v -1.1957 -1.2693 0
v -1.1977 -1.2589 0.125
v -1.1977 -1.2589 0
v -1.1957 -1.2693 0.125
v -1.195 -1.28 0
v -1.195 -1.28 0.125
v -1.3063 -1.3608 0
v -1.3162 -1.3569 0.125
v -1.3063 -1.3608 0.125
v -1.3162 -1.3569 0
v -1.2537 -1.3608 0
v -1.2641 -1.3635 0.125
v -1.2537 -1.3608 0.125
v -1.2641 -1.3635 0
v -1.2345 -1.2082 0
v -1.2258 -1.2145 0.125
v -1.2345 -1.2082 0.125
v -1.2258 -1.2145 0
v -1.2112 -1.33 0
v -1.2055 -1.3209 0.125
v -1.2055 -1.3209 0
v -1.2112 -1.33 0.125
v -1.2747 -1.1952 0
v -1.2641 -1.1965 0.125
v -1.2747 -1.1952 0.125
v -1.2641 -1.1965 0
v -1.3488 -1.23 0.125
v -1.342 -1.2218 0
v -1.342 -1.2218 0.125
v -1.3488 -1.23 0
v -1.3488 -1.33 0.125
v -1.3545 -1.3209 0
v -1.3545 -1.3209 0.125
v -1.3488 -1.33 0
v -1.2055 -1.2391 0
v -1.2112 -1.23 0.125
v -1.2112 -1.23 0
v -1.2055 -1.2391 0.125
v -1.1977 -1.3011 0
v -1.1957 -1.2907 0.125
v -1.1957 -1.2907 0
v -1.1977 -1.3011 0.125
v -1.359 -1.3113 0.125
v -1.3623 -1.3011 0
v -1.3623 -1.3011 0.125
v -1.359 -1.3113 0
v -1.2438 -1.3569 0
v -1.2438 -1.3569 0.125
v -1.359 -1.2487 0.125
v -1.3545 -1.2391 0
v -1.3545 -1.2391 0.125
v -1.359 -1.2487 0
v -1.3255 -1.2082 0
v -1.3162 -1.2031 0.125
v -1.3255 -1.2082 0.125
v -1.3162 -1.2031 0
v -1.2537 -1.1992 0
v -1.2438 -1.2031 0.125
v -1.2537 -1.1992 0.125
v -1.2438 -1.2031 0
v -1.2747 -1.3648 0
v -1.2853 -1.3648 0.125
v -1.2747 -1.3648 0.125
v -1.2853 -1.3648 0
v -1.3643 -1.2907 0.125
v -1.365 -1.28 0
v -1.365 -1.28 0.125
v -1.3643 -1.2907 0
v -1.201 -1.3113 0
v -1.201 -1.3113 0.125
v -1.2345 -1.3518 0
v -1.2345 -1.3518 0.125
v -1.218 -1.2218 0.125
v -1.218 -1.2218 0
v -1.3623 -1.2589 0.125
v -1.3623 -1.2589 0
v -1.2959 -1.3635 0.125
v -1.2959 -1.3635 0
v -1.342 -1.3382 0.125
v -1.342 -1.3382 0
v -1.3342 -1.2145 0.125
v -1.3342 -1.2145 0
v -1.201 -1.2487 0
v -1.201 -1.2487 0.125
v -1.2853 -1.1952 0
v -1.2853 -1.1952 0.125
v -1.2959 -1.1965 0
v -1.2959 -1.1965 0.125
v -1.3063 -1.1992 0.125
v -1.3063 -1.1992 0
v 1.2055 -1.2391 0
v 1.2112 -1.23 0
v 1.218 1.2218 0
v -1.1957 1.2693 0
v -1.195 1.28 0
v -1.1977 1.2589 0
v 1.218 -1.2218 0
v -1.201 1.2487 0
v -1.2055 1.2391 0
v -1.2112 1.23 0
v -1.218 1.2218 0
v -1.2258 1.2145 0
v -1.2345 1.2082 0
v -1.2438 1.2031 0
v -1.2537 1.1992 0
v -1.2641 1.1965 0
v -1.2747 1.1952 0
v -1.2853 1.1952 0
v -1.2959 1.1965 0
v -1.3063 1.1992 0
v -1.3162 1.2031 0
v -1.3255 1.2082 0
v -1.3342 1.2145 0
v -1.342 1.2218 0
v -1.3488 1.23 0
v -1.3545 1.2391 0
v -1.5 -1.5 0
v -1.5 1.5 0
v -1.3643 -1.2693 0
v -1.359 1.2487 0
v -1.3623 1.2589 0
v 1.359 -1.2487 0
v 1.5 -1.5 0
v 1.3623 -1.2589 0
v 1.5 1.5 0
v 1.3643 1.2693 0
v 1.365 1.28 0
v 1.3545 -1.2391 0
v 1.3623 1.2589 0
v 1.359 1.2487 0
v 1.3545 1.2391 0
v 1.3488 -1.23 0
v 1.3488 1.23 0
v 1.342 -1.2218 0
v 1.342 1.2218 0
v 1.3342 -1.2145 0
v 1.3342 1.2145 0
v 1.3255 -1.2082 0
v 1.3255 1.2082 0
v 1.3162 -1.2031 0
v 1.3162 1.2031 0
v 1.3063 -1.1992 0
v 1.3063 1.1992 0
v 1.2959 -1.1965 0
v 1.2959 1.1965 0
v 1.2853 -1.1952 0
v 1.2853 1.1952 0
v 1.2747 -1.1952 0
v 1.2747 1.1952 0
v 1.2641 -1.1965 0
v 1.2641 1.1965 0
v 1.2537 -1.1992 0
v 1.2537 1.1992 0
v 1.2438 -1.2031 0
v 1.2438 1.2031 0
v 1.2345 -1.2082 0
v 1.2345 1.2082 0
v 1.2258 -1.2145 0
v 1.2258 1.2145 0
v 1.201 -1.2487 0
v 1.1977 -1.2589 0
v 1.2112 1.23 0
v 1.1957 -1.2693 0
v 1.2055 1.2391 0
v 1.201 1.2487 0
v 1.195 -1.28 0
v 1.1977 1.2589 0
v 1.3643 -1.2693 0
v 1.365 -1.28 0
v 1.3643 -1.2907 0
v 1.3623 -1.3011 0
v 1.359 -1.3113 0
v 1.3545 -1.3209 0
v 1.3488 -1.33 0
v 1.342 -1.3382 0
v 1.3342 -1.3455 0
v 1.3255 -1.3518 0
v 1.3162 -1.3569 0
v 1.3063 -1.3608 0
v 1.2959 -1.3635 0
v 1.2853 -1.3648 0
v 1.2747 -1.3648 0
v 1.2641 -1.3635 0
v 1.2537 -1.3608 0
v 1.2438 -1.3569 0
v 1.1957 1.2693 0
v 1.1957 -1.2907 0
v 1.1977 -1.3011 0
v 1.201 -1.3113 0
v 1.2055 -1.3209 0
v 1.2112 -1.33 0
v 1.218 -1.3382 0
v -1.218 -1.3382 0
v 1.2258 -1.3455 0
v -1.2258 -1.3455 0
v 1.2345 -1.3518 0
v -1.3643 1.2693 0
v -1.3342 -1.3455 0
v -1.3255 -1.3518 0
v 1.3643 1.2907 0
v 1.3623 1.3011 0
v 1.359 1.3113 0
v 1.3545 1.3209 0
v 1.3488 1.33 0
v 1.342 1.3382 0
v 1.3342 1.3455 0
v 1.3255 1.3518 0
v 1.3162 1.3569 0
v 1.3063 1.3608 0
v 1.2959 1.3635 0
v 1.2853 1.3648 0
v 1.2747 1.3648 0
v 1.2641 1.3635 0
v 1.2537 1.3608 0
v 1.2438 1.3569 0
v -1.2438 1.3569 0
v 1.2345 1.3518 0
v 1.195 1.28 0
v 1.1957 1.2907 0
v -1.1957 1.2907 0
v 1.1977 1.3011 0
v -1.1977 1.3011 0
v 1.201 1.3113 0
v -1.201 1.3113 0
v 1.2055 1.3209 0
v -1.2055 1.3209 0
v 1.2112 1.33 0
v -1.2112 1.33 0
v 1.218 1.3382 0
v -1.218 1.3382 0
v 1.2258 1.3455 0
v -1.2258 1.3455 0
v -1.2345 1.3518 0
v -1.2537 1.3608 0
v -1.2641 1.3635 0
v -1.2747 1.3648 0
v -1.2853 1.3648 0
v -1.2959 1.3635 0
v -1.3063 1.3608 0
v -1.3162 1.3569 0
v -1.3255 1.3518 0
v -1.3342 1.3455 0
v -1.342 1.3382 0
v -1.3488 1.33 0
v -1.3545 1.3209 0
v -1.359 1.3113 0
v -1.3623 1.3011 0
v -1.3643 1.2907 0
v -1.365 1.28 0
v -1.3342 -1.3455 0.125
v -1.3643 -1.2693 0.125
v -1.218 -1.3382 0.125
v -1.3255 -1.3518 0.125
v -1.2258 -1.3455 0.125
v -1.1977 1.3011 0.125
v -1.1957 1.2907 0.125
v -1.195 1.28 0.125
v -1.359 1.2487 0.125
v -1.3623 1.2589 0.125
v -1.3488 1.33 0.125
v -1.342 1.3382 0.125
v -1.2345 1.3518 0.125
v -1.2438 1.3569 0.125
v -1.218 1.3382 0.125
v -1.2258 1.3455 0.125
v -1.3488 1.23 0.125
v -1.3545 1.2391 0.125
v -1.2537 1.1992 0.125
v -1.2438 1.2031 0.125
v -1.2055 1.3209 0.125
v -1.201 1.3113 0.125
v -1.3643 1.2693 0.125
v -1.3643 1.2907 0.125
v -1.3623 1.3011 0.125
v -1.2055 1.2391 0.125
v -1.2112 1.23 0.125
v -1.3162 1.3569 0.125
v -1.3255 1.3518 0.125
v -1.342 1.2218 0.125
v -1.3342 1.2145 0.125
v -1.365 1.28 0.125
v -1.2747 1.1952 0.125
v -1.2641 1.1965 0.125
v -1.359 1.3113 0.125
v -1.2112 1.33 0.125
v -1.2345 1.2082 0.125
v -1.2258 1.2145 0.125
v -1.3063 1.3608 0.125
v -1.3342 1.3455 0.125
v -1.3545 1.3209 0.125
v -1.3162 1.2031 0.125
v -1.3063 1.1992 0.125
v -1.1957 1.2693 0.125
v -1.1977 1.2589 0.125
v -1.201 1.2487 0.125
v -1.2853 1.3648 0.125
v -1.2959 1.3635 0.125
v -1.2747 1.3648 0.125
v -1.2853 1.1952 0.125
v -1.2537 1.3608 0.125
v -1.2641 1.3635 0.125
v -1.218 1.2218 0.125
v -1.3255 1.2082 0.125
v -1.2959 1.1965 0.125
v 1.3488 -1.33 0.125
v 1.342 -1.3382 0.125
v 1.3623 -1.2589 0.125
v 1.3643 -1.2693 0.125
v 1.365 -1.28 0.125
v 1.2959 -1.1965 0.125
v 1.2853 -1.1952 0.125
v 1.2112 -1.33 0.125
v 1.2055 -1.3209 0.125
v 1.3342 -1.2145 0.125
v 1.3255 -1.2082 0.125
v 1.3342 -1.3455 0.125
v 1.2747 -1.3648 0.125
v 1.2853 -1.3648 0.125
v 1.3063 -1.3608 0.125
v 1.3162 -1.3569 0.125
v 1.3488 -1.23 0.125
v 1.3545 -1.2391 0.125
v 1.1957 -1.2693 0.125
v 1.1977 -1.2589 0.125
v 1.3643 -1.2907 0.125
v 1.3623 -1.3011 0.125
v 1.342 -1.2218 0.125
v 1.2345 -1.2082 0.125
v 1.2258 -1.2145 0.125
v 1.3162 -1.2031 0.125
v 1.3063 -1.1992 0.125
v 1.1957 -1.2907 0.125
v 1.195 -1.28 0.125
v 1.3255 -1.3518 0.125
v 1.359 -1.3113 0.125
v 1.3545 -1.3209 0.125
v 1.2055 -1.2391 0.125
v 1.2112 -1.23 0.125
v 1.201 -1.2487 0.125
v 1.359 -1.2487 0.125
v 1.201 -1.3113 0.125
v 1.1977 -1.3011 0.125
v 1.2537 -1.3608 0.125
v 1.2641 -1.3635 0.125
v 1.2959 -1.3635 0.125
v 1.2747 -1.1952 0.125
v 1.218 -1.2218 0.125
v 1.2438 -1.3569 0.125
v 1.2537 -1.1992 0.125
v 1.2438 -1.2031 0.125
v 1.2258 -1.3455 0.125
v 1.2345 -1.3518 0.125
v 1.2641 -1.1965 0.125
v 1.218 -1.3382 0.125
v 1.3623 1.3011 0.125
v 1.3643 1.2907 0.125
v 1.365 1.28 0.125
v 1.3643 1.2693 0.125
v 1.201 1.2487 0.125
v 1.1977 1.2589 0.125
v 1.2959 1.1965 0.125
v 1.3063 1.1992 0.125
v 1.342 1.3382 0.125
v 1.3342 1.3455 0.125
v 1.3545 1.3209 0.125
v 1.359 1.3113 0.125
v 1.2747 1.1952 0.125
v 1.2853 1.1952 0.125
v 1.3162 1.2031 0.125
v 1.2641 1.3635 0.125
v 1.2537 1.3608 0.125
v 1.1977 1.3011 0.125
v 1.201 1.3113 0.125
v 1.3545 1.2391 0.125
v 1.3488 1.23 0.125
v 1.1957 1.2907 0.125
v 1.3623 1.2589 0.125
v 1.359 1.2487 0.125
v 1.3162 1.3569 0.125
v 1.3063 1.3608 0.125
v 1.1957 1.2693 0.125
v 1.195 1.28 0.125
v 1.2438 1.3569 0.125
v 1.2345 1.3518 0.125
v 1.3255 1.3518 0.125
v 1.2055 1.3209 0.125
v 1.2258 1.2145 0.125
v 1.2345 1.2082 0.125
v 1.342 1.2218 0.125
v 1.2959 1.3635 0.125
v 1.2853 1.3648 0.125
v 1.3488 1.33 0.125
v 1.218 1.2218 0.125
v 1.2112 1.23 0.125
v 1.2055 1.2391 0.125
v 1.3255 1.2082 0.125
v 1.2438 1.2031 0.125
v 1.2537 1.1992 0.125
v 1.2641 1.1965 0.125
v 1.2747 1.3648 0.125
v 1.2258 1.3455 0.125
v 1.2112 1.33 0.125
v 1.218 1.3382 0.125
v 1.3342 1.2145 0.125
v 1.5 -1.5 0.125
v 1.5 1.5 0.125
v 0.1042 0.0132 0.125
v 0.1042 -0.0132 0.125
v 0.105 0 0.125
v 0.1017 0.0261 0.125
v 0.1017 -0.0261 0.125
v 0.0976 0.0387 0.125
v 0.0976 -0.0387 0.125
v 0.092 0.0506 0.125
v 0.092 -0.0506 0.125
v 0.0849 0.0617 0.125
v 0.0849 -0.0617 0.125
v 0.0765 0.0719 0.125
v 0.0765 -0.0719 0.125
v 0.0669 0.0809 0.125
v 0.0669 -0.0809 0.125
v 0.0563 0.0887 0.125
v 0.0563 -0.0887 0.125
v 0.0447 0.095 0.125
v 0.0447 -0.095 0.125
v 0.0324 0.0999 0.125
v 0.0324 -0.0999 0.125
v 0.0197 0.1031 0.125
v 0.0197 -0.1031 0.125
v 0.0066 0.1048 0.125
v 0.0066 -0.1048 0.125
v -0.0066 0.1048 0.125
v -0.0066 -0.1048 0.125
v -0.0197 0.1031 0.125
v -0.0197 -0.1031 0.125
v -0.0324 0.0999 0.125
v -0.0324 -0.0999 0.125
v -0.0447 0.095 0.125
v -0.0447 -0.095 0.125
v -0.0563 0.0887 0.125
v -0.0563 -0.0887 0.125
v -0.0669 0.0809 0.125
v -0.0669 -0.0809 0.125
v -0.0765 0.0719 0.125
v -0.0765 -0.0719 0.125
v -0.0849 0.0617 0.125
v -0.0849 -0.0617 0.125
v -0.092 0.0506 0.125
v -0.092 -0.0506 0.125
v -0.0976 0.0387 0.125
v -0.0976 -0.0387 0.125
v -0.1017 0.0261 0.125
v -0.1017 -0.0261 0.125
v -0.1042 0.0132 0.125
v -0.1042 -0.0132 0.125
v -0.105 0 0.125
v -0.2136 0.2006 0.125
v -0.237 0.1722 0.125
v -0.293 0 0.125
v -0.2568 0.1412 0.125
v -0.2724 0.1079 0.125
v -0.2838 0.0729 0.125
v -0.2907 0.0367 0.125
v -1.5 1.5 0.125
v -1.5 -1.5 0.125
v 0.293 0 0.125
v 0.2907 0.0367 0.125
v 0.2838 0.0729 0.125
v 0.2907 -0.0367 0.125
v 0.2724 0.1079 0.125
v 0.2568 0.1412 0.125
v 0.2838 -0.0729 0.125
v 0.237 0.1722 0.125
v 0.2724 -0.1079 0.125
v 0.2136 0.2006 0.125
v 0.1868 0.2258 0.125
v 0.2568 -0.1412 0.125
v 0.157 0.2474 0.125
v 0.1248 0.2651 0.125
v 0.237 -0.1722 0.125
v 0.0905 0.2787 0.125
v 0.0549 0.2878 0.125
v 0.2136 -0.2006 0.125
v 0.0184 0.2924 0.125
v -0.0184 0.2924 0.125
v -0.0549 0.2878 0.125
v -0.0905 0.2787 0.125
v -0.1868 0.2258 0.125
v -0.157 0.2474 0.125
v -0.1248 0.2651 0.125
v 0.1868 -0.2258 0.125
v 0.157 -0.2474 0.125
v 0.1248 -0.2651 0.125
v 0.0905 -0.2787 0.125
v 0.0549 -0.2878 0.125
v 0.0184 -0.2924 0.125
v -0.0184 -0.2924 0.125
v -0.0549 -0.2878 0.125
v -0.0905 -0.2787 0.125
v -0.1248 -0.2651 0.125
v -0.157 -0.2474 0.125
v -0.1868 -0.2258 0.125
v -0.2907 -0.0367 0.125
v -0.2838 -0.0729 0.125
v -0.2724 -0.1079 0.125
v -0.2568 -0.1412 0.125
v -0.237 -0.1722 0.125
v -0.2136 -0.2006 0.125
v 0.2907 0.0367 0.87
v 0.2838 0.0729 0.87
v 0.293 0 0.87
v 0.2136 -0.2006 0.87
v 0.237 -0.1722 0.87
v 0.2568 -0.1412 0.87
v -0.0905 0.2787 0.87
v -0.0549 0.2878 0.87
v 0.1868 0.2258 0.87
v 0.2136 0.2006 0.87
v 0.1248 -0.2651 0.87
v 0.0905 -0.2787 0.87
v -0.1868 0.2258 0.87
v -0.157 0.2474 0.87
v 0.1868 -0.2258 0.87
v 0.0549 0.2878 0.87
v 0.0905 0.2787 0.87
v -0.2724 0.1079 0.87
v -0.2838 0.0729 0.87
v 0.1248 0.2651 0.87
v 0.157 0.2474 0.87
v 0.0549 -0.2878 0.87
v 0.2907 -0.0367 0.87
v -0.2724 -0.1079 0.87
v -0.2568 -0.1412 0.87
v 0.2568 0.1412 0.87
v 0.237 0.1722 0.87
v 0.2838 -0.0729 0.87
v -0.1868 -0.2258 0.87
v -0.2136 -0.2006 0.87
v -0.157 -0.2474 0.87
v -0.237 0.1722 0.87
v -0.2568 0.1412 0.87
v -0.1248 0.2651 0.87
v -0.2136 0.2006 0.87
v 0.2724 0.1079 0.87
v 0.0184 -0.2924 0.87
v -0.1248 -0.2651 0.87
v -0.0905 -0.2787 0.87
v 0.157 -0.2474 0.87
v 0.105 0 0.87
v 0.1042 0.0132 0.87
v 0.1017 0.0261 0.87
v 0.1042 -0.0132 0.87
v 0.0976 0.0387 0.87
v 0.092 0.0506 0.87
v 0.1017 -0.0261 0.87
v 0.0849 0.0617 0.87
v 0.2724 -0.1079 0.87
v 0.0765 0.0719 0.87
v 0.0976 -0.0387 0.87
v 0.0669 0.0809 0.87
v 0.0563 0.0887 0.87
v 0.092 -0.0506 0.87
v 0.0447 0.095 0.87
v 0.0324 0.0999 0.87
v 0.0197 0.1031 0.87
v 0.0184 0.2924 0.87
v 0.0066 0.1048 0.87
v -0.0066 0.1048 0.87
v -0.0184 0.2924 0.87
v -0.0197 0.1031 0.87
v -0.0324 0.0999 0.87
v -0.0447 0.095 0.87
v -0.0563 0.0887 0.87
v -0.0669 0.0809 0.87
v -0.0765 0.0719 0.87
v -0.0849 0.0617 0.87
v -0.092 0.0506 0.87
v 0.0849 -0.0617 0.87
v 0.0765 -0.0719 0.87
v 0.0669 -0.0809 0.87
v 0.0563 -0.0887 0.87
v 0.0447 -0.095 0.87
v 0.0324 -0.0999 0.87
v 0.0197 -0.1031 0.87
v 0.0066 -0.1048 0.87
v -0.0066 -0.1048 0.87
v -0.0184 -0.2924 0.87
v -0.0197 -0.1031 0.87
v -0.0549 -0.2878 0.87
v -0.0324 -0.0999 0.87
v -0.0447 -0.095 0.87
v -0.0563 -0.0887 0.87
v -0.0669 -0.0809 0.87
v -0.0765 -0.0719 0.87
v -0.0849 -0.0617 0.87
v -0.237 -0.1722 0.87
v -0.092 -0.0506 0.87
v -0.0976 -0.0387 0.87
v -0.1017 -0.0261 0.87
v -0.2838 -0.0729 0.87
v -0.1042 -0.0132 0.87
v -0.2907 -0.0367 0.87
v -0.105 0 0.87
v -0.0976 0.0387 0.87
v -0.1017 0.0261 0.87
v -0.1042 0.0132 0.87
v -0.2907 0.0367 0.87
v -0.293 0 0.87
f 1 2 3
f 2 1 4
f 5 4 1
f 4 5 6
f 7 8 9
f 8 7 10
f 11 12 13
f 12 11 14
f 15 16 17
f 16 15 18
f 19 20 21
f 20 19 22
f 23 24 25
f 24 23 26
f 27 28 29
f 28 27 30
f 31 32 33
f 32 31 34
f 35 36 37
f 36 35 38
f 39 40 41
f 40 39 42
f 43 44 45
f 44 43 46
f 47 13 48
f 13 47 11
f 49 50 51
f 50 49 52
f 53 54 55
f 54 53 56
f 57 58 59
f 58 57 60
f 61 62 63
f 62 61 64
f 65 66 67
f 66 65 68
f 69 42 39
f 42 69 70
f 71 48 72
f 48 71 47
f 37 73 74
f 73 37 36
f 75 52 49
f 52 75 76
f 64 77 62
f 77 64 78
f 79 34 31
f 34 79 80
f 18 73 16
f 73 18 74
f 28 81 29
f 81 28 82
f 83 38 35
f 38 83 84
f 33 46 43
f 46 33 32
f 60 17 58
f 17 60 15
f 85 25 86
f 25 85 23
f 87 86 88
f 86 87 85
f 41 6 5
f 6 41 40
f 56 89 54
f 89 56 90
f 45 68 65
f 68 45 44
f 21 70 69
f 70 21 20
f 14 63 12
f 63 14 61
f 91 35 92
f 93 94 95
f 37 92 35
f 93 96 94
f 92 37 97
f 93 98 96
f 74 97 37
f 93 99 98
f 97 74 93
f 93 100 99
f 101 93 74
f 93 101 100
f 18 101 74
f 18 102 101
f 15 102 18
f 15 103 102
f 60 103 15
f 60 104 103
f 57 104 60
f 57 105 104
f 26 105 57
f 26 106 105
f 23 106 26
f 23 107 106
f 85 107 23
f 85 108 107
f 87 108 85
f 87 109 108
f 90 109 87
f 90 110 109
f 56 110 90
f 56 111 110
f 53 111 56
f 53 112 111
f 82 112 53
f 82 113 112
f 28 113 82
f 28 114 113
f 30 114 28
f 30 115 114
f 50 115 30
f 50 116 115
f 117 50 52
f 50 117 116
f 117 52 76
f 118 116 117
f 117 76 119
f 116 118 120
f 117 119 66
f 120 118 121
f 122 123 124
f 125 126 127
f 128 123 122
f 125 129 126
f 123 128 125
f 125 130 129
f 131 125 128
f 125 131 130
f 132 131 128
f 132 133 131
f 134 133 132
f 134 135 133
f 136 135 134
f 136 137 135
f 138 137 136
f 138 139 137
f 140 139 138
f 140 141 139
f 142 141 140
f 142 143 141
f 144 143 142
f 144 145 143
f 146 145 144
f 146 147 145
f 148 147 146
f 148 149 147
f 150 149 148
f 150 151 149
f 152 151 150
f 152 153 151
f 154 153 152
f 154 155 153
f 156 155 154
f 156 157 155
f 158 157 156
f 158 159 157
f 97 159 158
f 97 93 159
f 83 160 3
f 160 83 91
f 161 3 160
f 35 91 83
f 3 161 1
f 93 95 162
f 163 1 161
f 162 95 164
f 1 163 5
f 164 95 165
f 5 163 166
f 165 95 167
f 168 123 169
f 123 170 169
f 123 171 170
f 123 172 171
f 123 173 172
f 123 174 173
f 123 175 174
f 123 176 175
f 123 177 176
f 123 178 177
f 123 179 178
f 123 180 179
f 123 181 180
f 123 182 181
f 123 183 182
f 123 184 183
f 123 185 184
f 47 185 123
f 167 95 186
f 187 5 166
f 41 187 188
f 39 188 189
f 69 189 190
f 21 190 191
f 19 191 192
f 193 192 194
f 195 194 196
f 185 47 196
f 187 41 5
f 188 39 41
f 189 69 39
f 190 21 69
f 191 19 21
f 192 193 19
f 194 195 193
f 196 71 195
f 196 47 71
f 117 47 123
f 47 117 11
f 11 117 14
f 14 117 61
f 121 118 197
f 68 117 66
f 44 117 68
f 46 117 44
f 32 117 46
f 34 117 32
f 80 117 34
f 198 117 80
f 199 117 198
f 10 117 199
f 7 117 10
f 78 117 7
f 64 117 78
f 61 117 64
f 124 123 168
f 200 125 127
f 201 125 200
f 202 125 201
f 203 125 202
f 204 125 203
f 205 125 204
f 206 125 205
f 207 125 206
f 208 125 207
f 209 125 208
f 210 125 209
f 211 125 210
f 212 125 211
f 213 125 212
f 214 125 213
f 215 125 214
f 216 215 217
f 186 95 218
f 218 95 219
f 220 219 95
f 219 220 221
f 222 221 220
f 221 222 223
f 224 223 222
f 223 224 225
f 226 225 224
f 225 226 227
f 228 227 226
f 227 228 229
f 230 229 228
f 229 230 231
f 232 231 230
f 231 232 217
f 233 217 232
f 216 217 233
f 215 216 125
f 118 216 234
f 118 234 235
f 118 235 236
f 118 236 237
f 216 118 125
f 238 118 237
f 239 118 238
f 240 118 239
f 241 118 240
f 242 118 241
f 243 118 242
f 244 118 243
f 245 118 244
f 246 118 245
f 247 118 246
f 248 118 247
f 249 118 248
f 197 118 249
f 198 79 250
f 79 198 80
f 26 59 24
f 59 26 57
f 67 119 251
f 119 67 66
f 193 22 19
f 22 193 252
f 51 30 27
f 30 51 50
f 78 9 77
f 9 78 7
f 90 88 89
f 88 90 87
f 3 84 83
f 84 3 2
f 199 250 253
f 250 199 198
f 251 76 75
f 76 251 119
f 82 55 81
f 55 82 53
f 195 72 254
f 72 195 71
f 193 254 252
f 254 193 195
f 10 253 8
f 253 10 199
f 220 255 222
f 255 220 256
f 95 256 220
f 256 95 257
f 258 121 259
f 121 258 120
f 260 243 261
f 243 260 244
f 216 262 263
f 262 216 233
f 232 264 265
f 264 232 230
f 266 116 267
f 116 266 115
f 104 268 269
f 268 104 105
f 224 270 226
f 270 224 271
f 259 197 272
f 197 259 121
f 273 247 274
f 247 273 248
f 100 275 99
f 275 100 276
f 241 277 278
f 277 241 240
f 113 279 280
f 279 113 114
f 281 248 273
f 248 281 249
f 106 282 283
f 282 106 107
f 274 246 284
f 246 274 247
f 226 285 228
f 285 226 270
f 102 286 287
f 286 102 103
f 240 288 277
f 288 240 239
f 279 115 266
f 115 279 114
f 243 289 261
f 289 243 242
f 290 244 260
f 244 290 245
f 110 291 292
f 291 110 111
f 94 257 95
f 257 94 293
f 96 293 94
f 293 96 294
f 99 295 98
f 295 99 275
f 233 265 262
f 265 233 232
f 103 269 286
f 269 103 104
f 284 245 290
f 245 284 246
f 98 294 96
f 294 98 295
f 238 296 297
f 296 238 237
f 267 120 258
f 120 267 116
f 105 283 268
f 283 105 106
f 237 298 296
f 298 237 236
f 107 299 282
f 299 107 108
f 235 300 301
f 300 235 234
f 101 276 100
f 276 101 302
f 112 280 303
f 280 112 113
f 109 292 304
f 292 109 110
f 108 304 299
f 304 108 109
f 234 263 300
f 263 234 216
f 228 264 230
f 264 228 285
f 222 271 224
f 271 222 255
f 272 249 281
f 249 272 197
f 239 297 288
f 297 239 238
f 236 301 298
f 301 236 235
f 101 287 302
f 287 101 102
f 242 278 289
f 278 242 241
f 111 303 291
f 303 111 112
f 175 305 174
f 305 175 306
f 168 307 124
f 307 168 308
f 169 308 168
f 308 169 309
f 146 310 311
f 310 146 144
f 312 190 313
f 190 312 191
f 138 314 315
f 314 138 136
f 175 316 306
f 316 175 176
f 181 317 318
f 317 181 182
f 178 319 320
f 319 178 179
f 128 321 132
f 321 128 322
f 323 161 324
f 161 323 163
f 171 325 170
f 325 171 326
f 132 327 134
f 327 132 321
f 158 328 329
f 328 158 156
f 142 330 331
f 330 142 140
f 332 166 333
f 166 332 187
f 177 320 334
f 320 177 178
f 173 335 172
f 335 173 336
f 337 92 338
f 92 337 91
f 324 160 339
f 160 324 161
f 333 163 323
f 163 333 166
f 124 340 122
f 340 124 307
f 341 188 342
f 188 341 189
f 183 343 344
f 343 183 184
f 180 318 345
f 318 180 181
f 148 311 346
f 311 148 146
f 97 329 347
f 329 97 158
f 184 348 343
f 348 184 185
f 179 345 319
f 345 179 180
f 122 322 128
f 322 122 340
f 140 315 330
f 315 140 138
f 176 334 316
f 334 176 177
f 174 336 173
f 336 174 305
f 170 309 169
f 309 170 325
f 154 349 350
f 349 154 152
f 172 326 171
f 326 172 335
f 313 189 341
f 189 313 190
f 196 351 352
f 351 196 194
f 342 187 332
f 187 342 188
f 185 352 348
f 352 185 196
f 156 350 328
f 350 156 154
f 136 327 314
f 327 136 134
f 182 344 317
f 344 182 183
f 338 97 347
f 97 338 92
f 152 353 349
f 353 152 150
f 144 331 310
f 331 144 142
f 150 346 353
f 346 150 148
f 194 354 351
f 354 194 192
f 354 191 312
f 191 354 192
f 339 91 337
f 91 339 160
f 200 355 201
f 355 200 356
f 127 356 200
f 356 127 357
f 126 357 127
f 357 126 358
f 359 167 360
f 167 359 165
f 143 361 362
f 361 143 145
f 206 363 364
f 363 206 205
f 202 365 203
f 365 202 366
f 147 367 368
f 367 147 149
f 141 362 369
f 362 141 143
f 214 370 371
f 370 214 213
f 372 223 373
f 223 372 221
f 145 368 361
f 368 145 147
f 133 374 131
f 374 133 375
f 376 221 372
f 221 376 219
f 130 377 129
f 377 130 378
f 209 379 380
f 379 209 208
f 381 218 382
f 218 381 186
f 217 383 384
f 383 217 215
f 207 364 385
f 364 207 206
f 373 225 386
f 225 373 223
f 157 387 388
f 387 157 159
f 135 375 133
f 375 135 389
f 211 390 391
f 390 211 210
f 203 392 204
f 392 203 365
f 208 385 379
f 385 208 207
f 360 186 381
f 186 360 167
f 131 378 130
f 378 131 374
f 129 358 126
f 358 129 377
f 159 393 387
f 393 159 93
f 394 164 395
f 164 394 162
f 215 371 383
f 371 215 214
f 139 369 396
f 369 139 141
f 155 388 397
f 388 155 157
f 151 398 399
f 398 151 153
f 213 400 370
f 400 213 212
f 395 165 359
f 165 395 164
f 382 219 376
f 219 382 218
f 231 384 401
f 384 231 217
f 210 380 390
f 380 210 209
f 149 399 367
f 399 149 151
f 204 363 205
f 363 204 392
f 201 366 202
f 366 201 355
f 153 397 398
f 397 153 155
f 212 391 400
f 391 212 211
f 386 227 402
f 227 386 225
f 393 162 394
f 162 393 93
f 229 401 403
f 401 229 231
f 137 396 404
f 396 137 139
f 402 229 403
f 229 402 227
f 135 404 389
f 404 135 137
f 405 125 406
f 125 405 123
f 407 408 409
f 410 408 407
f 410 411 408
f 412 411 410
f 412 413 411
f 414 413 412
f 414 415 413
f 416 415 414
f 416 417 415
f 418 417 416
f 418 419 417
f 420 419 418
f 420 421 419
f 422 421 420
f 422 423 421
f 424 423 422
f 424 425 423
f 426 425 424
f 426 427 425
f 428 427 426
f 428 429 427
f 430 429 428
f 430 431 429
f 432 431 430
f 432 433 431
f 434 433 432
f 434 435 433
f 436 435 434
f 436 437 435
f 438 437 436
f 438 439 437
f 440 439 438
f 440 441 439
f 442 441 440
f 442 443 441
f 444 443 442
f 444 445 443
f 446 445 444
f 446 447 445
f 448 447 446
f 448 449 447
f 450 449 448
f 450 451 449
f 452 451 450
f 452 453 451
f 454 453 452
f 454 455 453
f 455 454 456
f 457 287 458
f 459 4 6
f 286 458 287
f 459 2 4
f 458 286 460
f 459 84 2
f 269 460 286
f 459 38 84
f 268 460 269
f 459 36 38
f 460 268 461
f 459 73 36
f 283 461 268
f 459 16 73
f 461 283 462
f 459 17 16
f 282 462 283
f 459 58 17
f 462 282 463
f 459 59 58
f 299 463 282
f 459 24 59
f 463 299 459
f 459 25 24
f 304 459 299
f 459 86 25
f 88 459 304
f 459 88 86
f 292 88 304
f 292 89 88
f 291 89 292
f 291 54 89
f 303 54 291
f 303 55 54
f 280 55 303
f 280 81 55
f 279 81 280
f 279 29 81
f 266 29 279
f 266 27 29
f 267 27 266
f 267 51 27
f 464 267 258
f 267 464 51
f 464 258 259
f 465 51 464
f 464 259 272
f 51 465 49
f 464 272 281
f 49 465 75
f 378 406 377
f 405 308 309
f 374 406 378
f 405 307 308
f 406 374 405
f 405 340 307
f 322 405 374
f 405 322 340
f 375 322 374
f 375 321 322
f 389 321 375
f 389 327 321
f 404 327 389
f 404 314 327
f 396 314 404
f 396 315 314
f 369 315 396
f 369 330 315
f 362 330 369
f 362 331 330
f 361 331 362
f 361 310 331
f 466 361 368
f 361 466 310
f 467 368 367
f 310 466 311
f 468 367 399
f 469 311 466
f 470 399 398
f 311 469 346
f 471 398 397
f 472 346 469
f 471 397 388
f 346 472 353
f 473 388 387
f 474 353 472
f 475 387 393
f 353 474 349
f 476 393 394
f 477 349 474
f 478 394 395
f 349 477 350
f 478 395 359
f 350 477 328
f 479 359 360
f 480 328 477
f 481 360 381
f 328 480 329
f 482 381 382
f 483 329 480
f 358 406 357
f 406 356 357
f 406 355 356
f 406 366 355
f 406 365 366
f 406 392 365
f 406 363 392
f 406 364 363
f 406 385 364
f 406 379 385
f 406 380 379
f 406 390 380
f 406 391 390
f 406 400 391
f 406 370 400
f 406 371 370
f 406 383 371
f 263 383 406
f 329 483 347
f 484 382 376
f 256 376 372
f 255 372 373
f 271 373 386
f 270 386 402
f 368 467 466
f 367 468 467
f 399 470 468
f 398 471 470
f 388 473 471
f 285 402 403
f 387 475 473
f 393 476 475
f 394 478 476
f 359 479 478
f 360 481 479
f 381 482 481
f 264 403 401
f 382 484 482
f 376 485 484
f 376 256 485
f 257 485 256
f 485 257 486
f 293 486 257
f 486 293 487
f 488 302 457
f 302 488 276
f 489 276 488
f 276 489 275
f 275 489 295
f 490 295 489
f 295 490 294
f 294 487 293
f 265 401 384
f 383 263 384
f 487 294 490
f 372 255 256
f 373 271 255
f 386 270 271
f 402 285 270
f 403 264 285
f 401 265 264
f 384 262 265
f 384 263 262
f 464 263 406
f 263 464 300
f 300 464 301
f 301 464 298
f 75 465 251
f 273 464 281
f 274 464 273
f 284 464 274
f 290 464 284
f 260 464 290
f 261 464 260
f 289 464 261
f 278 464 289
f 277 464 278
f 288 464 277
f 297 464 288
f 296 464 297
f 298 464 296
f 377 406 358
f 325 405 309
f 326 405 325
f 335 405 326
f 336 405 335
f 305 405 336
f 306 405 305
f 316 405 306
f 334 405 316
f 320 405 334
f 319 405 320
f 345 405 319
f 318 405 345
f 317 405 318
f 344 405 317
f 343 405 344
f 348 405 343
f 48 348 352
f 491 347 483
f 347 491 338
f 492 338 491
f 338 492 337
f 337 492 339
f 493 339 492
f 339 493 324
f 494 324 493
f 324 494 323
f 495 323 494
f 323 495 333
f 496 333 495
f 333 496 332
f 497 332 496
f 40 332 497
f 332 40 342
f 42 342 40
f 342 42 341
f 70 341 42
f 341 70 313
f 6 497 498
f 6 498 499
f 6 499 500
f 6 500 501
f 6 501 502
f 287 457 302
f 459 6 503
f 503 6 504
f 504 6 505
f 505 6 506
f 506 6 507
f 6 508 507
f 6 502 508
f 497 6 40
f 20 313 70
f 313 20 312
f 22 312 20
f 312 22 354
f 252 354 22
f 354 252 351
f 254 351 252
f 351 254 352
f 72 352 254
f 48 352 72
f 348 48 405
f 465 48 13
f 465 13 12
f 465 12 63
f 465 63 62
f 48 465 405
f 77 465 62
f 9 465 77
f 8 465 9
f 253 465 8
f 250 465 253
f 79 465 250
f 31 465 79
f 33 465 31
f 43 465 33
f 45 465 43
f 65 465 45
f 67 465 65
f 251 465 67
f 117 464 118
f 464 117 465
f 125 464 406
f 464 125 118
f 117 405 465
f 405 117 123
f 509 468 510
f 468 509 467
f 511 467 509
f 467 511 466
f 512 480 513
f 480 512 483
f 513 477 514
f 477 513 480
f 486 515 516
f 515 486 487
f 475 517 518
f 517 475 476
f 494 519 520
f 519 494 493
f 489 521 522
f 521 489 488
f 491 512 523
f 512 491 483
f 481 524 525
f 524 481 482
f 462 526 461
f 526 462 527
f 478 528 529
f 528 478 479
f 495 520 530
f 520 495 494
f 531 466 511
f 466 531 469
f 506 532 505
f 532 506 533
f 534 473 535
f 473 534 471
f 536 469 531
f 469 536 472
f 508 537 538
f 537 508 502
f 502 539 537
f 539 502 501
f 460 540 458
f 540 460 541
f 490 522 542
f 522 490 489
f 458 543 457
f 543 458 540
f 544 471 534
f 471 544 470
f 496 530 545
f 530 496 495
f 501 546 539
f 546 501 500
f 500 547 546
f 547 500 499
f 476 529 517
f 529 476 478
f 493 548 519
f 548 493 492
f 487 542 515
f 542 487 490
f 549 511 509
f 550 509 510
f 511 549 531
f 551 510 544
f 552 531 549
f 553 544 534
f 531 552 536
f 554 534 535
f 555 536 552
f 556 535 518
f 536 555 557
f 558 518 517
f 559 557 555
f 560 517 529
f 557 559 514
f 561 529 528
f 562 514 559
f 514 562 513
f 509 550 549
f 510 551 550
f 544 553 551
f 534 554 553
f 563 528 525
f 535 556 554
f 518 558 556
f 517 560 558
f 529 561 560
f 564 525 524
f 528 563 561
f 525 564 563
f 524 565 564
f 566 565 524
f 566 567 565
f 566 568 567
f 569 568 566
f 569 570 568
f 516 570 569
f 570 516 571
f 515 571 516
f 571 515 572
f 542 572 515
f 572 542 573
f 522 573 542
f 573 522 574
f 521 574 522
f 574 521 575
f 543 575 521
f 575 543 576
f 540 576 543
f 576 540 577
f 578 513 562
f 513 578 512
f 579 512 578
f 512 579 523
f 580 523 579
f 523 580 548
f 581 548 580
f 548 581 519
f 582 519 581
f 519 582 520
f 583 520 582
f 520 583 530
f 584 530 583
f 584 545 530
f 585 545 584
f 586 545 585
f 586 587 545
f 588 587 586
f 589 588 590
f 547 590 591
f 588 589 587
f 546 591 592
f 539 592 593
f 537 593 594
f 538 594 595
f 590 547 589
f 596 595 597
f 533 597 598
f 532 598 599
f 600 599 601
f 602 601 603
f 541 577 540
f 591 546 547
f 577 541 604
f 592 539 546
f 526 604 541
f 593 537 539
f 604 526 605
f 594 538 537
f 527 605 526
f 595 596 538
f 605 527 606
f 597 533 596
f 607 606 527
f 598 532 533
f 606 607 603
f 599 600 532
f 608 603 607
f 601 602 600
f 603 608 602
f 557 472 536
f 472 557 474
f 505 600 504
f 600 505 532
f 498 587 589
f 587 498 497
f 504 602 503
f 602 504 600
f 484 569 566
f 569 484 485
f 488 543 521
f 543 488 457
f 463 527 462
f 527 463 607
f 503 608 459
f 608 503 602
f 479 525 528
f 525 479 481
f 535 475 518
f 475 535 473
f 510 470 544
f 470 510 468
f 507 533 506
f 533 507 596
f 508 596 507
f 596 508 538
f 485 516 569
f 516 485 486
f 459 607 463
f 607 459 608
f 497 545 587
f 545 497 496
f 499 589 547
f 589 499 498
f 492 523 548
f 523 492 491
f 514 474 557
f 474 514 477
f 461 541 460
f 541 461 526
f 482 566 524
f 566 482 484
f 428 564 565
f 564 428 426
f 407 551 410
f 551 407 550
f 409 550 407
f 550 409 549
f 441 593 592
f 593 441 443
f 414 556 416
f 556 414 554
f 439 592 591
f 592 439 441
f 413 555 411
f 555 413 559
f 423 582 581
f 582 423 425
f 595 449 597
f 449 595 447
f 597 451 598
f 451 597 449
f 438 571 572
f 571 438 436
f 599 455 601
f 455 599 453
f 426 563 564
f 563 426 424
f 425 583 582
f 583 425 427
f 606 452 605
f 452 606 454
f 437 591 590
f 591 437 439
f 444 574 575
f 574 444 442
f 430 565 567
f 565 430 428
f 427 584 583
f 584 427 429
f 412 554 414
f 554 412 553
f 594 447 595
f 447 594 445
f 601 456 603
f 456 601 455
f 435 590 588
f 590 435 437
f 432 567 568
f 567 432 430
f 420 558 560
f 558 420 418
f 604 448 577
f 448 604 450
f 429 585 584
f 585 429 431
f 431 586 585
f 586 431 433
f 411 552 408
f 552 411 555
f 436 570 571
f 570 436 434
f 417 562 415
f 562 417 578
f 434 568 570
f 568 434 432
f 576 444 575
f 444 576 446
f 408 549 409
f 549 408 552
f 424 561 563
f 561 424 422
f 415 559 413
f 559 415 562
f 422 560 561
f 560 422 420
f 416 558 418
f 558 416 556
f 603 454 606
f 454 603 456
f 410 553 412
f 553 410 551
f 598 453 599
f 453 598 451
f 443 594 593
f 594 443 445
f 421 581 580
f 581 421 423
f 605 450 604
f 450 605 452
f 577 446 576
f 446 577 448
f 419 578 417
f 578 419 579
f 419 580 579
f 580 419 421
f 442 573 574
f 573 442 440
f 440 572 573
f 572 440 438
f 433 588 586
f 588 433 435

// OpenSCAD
//Written by Ryan Branch on 7/8/2017
//Default values are listed in inches

//Special variables:
$fn = 50;

//User-defined parameters:
    //TURNTABLE SPECIFICATIONS
    turntable_width = 3.000;
    turntable_thickness = 0.390;
    turntable_top_hole_spacing = 2.560;
    turntable_top_hole_diameter = 0.17;
    turntable_bottom_hole_spacing = 2.560;
    turntable_bottom_hole_diameter = 0.17;
    turntable_central_hole_diameter = 2.710;
    //MOTOR SPECIFICATIONS
    motor_width = 1.700;
    motor_body_height = 1.950;
    motor_raised_circle_height = 0.090;
    motor_raised_circle_diameter = 0.880;
    motor_hole_spacing = 1.220;
    motor_hole_diameter = 0.160;
    motor_shaft_length = 0.945;
    motor_shaft_diameter = 0.210;
	motor_wire_exit_width = 0.510;
    motor_wire_exit_height = 0.510;
    //Thickness of extra space for sliding wire between motor wall and part wall
    motor_wire_clearance_width = 0.250;
    //The distance above the motor face plate that any component sticks out
    motor_clearance_height = 0.2;
    //FASTENER SPECIFICATIONS
    outside_bottom_nut_thickness = 0.080;
    outside_bottom_nut_largest_diameter = 0.270;
    inside_bottom_nut_thickness = 0.080;
    inside_bottom_nut_largest_diameter = 0.270;
    top_nut_thickness = 0.080;
    top_nut_largest_diameter = 0.270;

//Writer-defined parameters:
    //BOTTOM PARAMETERS
    
    //LOWER BRACKET PARAMETERS
    //horizontal thicknesses
    hthick_lower_bracket_walls = 0.500;
    
    //UPPER BRACKET PARAMETERS
    //vertical thicknesses
    vthick_bottom_plate = 0.250;
    vthick_upper_bracket_plate = 0.125;
    vthick_top_plate = 0.250;
    vthick_space_below_coupler = 0.100;
    //"below" refers to after the part has been flipped over 180 degrees
    vthick_below_vents = 0.250;
    //horizontal thicknesses
    hthick_shaft_coupler_ring = 0.188;
    hthick_shaft_coupler_panel = 0.100;
    hthick_shaft_coupler_gap = 0.03;
    //other
    shaft_coupler_panel_length = 0.300;
    shaft_coupler_hole_diameter = 0.160;
    
    //TOP PARAMETERS


//Part 3: Upper Bracket
// - This part is connected to the Top Plate as well as the
//    turntable top holes via the outside holes
// - Further, it contains a shaft coupler which is used to fasten the
//    part to the stepper motor. It is bt this mechanism that rotation
//    of the top plate is achieved, while the bottom plate remains fixed
union() {
    
//This first difference() is used to create the flat plate
//  portion of the bracket which attaches via threaded rod
difference() {
    //The height of the bracket's lower portion is
    //equal to the length of the motor's body.
    //It's created horizontally centered but vertically at 0
    translate([0,0,(vthick_upper_bracket_plate / 2)]) {
        cube([turntable_width, turntable_width, vthick_upper_bracket_plate], true);
    }
    
    //Holes which are subtracted from the lower portion
    for(xMultiplier = [-1:2:1]) {
        for(yMultiplier = [-1:2:1]) {
            //Holes for attaching to Bottom Plate
            translate([(xMultiplier * (turntable_bottom_hole_spacing / 2)),
                       (yMultiplier * (turntable_bottom_hole_spacing / 2)),
                       0]) {
                cylinder(motor_body_height,
                         (turntable_bottom_hole_diameter / 2),
                         (turntable_bottom_hole_diameter / 2));
            }
            
        }
    }
}   //difference()
 
//Some preliminary math work:
outerRadius = (motor_shaft_diameter) / 2 + hthick_shaft_coupler_ring;
radiusToPanel = outerRadius * 
                cos(asin((hthick_shaft_coupler_panel +          
                               (hthick_shaft_coupler_gap / 2)) / outerRadius));
 
//This second difference() is used to create the shaft coupler portion
difference() {
    //The height of the shaft coupler portion is somewhat arbitrarily made
    //  equal to the length of the motor's shaft,
    //  minus the thickness of the turntable.
    //  In actuality it simply must less than the length of the shaft
    union() {
        //The ring of the shaft coupler which grips the shaft
        translate([0,0,(motor_shaft_length +
                        vthick_upper_bracket_plate -
                        motor_clearance_height) / 2]) {
            cylinder((motor_shaft_length +
                      vthick_upper_bracket_plate -
                      motor_clearance_height),
                     (motor_shaft_diameter / 2) + hthick_shaft_coupler_ring,
                     (motor_shaft_diameter / 2) + hthick_shaft_coupler_ring,
                     true);
        }
    }


    //Cylindrical hole into which the motor shaft is inserted
    translate([0,0,(vthick_upper_bracket_plate +
                    ((motor_shaft_length - motor_clearance_height) / 2))]) {
        cylinder((motor_shaft_length - motor_clearance_height),
                 (motor_shaft_diameter / 2),
                 (motor_shaft_diameter / 2),
                 true);
    }
    
} //difference()

} //union()
